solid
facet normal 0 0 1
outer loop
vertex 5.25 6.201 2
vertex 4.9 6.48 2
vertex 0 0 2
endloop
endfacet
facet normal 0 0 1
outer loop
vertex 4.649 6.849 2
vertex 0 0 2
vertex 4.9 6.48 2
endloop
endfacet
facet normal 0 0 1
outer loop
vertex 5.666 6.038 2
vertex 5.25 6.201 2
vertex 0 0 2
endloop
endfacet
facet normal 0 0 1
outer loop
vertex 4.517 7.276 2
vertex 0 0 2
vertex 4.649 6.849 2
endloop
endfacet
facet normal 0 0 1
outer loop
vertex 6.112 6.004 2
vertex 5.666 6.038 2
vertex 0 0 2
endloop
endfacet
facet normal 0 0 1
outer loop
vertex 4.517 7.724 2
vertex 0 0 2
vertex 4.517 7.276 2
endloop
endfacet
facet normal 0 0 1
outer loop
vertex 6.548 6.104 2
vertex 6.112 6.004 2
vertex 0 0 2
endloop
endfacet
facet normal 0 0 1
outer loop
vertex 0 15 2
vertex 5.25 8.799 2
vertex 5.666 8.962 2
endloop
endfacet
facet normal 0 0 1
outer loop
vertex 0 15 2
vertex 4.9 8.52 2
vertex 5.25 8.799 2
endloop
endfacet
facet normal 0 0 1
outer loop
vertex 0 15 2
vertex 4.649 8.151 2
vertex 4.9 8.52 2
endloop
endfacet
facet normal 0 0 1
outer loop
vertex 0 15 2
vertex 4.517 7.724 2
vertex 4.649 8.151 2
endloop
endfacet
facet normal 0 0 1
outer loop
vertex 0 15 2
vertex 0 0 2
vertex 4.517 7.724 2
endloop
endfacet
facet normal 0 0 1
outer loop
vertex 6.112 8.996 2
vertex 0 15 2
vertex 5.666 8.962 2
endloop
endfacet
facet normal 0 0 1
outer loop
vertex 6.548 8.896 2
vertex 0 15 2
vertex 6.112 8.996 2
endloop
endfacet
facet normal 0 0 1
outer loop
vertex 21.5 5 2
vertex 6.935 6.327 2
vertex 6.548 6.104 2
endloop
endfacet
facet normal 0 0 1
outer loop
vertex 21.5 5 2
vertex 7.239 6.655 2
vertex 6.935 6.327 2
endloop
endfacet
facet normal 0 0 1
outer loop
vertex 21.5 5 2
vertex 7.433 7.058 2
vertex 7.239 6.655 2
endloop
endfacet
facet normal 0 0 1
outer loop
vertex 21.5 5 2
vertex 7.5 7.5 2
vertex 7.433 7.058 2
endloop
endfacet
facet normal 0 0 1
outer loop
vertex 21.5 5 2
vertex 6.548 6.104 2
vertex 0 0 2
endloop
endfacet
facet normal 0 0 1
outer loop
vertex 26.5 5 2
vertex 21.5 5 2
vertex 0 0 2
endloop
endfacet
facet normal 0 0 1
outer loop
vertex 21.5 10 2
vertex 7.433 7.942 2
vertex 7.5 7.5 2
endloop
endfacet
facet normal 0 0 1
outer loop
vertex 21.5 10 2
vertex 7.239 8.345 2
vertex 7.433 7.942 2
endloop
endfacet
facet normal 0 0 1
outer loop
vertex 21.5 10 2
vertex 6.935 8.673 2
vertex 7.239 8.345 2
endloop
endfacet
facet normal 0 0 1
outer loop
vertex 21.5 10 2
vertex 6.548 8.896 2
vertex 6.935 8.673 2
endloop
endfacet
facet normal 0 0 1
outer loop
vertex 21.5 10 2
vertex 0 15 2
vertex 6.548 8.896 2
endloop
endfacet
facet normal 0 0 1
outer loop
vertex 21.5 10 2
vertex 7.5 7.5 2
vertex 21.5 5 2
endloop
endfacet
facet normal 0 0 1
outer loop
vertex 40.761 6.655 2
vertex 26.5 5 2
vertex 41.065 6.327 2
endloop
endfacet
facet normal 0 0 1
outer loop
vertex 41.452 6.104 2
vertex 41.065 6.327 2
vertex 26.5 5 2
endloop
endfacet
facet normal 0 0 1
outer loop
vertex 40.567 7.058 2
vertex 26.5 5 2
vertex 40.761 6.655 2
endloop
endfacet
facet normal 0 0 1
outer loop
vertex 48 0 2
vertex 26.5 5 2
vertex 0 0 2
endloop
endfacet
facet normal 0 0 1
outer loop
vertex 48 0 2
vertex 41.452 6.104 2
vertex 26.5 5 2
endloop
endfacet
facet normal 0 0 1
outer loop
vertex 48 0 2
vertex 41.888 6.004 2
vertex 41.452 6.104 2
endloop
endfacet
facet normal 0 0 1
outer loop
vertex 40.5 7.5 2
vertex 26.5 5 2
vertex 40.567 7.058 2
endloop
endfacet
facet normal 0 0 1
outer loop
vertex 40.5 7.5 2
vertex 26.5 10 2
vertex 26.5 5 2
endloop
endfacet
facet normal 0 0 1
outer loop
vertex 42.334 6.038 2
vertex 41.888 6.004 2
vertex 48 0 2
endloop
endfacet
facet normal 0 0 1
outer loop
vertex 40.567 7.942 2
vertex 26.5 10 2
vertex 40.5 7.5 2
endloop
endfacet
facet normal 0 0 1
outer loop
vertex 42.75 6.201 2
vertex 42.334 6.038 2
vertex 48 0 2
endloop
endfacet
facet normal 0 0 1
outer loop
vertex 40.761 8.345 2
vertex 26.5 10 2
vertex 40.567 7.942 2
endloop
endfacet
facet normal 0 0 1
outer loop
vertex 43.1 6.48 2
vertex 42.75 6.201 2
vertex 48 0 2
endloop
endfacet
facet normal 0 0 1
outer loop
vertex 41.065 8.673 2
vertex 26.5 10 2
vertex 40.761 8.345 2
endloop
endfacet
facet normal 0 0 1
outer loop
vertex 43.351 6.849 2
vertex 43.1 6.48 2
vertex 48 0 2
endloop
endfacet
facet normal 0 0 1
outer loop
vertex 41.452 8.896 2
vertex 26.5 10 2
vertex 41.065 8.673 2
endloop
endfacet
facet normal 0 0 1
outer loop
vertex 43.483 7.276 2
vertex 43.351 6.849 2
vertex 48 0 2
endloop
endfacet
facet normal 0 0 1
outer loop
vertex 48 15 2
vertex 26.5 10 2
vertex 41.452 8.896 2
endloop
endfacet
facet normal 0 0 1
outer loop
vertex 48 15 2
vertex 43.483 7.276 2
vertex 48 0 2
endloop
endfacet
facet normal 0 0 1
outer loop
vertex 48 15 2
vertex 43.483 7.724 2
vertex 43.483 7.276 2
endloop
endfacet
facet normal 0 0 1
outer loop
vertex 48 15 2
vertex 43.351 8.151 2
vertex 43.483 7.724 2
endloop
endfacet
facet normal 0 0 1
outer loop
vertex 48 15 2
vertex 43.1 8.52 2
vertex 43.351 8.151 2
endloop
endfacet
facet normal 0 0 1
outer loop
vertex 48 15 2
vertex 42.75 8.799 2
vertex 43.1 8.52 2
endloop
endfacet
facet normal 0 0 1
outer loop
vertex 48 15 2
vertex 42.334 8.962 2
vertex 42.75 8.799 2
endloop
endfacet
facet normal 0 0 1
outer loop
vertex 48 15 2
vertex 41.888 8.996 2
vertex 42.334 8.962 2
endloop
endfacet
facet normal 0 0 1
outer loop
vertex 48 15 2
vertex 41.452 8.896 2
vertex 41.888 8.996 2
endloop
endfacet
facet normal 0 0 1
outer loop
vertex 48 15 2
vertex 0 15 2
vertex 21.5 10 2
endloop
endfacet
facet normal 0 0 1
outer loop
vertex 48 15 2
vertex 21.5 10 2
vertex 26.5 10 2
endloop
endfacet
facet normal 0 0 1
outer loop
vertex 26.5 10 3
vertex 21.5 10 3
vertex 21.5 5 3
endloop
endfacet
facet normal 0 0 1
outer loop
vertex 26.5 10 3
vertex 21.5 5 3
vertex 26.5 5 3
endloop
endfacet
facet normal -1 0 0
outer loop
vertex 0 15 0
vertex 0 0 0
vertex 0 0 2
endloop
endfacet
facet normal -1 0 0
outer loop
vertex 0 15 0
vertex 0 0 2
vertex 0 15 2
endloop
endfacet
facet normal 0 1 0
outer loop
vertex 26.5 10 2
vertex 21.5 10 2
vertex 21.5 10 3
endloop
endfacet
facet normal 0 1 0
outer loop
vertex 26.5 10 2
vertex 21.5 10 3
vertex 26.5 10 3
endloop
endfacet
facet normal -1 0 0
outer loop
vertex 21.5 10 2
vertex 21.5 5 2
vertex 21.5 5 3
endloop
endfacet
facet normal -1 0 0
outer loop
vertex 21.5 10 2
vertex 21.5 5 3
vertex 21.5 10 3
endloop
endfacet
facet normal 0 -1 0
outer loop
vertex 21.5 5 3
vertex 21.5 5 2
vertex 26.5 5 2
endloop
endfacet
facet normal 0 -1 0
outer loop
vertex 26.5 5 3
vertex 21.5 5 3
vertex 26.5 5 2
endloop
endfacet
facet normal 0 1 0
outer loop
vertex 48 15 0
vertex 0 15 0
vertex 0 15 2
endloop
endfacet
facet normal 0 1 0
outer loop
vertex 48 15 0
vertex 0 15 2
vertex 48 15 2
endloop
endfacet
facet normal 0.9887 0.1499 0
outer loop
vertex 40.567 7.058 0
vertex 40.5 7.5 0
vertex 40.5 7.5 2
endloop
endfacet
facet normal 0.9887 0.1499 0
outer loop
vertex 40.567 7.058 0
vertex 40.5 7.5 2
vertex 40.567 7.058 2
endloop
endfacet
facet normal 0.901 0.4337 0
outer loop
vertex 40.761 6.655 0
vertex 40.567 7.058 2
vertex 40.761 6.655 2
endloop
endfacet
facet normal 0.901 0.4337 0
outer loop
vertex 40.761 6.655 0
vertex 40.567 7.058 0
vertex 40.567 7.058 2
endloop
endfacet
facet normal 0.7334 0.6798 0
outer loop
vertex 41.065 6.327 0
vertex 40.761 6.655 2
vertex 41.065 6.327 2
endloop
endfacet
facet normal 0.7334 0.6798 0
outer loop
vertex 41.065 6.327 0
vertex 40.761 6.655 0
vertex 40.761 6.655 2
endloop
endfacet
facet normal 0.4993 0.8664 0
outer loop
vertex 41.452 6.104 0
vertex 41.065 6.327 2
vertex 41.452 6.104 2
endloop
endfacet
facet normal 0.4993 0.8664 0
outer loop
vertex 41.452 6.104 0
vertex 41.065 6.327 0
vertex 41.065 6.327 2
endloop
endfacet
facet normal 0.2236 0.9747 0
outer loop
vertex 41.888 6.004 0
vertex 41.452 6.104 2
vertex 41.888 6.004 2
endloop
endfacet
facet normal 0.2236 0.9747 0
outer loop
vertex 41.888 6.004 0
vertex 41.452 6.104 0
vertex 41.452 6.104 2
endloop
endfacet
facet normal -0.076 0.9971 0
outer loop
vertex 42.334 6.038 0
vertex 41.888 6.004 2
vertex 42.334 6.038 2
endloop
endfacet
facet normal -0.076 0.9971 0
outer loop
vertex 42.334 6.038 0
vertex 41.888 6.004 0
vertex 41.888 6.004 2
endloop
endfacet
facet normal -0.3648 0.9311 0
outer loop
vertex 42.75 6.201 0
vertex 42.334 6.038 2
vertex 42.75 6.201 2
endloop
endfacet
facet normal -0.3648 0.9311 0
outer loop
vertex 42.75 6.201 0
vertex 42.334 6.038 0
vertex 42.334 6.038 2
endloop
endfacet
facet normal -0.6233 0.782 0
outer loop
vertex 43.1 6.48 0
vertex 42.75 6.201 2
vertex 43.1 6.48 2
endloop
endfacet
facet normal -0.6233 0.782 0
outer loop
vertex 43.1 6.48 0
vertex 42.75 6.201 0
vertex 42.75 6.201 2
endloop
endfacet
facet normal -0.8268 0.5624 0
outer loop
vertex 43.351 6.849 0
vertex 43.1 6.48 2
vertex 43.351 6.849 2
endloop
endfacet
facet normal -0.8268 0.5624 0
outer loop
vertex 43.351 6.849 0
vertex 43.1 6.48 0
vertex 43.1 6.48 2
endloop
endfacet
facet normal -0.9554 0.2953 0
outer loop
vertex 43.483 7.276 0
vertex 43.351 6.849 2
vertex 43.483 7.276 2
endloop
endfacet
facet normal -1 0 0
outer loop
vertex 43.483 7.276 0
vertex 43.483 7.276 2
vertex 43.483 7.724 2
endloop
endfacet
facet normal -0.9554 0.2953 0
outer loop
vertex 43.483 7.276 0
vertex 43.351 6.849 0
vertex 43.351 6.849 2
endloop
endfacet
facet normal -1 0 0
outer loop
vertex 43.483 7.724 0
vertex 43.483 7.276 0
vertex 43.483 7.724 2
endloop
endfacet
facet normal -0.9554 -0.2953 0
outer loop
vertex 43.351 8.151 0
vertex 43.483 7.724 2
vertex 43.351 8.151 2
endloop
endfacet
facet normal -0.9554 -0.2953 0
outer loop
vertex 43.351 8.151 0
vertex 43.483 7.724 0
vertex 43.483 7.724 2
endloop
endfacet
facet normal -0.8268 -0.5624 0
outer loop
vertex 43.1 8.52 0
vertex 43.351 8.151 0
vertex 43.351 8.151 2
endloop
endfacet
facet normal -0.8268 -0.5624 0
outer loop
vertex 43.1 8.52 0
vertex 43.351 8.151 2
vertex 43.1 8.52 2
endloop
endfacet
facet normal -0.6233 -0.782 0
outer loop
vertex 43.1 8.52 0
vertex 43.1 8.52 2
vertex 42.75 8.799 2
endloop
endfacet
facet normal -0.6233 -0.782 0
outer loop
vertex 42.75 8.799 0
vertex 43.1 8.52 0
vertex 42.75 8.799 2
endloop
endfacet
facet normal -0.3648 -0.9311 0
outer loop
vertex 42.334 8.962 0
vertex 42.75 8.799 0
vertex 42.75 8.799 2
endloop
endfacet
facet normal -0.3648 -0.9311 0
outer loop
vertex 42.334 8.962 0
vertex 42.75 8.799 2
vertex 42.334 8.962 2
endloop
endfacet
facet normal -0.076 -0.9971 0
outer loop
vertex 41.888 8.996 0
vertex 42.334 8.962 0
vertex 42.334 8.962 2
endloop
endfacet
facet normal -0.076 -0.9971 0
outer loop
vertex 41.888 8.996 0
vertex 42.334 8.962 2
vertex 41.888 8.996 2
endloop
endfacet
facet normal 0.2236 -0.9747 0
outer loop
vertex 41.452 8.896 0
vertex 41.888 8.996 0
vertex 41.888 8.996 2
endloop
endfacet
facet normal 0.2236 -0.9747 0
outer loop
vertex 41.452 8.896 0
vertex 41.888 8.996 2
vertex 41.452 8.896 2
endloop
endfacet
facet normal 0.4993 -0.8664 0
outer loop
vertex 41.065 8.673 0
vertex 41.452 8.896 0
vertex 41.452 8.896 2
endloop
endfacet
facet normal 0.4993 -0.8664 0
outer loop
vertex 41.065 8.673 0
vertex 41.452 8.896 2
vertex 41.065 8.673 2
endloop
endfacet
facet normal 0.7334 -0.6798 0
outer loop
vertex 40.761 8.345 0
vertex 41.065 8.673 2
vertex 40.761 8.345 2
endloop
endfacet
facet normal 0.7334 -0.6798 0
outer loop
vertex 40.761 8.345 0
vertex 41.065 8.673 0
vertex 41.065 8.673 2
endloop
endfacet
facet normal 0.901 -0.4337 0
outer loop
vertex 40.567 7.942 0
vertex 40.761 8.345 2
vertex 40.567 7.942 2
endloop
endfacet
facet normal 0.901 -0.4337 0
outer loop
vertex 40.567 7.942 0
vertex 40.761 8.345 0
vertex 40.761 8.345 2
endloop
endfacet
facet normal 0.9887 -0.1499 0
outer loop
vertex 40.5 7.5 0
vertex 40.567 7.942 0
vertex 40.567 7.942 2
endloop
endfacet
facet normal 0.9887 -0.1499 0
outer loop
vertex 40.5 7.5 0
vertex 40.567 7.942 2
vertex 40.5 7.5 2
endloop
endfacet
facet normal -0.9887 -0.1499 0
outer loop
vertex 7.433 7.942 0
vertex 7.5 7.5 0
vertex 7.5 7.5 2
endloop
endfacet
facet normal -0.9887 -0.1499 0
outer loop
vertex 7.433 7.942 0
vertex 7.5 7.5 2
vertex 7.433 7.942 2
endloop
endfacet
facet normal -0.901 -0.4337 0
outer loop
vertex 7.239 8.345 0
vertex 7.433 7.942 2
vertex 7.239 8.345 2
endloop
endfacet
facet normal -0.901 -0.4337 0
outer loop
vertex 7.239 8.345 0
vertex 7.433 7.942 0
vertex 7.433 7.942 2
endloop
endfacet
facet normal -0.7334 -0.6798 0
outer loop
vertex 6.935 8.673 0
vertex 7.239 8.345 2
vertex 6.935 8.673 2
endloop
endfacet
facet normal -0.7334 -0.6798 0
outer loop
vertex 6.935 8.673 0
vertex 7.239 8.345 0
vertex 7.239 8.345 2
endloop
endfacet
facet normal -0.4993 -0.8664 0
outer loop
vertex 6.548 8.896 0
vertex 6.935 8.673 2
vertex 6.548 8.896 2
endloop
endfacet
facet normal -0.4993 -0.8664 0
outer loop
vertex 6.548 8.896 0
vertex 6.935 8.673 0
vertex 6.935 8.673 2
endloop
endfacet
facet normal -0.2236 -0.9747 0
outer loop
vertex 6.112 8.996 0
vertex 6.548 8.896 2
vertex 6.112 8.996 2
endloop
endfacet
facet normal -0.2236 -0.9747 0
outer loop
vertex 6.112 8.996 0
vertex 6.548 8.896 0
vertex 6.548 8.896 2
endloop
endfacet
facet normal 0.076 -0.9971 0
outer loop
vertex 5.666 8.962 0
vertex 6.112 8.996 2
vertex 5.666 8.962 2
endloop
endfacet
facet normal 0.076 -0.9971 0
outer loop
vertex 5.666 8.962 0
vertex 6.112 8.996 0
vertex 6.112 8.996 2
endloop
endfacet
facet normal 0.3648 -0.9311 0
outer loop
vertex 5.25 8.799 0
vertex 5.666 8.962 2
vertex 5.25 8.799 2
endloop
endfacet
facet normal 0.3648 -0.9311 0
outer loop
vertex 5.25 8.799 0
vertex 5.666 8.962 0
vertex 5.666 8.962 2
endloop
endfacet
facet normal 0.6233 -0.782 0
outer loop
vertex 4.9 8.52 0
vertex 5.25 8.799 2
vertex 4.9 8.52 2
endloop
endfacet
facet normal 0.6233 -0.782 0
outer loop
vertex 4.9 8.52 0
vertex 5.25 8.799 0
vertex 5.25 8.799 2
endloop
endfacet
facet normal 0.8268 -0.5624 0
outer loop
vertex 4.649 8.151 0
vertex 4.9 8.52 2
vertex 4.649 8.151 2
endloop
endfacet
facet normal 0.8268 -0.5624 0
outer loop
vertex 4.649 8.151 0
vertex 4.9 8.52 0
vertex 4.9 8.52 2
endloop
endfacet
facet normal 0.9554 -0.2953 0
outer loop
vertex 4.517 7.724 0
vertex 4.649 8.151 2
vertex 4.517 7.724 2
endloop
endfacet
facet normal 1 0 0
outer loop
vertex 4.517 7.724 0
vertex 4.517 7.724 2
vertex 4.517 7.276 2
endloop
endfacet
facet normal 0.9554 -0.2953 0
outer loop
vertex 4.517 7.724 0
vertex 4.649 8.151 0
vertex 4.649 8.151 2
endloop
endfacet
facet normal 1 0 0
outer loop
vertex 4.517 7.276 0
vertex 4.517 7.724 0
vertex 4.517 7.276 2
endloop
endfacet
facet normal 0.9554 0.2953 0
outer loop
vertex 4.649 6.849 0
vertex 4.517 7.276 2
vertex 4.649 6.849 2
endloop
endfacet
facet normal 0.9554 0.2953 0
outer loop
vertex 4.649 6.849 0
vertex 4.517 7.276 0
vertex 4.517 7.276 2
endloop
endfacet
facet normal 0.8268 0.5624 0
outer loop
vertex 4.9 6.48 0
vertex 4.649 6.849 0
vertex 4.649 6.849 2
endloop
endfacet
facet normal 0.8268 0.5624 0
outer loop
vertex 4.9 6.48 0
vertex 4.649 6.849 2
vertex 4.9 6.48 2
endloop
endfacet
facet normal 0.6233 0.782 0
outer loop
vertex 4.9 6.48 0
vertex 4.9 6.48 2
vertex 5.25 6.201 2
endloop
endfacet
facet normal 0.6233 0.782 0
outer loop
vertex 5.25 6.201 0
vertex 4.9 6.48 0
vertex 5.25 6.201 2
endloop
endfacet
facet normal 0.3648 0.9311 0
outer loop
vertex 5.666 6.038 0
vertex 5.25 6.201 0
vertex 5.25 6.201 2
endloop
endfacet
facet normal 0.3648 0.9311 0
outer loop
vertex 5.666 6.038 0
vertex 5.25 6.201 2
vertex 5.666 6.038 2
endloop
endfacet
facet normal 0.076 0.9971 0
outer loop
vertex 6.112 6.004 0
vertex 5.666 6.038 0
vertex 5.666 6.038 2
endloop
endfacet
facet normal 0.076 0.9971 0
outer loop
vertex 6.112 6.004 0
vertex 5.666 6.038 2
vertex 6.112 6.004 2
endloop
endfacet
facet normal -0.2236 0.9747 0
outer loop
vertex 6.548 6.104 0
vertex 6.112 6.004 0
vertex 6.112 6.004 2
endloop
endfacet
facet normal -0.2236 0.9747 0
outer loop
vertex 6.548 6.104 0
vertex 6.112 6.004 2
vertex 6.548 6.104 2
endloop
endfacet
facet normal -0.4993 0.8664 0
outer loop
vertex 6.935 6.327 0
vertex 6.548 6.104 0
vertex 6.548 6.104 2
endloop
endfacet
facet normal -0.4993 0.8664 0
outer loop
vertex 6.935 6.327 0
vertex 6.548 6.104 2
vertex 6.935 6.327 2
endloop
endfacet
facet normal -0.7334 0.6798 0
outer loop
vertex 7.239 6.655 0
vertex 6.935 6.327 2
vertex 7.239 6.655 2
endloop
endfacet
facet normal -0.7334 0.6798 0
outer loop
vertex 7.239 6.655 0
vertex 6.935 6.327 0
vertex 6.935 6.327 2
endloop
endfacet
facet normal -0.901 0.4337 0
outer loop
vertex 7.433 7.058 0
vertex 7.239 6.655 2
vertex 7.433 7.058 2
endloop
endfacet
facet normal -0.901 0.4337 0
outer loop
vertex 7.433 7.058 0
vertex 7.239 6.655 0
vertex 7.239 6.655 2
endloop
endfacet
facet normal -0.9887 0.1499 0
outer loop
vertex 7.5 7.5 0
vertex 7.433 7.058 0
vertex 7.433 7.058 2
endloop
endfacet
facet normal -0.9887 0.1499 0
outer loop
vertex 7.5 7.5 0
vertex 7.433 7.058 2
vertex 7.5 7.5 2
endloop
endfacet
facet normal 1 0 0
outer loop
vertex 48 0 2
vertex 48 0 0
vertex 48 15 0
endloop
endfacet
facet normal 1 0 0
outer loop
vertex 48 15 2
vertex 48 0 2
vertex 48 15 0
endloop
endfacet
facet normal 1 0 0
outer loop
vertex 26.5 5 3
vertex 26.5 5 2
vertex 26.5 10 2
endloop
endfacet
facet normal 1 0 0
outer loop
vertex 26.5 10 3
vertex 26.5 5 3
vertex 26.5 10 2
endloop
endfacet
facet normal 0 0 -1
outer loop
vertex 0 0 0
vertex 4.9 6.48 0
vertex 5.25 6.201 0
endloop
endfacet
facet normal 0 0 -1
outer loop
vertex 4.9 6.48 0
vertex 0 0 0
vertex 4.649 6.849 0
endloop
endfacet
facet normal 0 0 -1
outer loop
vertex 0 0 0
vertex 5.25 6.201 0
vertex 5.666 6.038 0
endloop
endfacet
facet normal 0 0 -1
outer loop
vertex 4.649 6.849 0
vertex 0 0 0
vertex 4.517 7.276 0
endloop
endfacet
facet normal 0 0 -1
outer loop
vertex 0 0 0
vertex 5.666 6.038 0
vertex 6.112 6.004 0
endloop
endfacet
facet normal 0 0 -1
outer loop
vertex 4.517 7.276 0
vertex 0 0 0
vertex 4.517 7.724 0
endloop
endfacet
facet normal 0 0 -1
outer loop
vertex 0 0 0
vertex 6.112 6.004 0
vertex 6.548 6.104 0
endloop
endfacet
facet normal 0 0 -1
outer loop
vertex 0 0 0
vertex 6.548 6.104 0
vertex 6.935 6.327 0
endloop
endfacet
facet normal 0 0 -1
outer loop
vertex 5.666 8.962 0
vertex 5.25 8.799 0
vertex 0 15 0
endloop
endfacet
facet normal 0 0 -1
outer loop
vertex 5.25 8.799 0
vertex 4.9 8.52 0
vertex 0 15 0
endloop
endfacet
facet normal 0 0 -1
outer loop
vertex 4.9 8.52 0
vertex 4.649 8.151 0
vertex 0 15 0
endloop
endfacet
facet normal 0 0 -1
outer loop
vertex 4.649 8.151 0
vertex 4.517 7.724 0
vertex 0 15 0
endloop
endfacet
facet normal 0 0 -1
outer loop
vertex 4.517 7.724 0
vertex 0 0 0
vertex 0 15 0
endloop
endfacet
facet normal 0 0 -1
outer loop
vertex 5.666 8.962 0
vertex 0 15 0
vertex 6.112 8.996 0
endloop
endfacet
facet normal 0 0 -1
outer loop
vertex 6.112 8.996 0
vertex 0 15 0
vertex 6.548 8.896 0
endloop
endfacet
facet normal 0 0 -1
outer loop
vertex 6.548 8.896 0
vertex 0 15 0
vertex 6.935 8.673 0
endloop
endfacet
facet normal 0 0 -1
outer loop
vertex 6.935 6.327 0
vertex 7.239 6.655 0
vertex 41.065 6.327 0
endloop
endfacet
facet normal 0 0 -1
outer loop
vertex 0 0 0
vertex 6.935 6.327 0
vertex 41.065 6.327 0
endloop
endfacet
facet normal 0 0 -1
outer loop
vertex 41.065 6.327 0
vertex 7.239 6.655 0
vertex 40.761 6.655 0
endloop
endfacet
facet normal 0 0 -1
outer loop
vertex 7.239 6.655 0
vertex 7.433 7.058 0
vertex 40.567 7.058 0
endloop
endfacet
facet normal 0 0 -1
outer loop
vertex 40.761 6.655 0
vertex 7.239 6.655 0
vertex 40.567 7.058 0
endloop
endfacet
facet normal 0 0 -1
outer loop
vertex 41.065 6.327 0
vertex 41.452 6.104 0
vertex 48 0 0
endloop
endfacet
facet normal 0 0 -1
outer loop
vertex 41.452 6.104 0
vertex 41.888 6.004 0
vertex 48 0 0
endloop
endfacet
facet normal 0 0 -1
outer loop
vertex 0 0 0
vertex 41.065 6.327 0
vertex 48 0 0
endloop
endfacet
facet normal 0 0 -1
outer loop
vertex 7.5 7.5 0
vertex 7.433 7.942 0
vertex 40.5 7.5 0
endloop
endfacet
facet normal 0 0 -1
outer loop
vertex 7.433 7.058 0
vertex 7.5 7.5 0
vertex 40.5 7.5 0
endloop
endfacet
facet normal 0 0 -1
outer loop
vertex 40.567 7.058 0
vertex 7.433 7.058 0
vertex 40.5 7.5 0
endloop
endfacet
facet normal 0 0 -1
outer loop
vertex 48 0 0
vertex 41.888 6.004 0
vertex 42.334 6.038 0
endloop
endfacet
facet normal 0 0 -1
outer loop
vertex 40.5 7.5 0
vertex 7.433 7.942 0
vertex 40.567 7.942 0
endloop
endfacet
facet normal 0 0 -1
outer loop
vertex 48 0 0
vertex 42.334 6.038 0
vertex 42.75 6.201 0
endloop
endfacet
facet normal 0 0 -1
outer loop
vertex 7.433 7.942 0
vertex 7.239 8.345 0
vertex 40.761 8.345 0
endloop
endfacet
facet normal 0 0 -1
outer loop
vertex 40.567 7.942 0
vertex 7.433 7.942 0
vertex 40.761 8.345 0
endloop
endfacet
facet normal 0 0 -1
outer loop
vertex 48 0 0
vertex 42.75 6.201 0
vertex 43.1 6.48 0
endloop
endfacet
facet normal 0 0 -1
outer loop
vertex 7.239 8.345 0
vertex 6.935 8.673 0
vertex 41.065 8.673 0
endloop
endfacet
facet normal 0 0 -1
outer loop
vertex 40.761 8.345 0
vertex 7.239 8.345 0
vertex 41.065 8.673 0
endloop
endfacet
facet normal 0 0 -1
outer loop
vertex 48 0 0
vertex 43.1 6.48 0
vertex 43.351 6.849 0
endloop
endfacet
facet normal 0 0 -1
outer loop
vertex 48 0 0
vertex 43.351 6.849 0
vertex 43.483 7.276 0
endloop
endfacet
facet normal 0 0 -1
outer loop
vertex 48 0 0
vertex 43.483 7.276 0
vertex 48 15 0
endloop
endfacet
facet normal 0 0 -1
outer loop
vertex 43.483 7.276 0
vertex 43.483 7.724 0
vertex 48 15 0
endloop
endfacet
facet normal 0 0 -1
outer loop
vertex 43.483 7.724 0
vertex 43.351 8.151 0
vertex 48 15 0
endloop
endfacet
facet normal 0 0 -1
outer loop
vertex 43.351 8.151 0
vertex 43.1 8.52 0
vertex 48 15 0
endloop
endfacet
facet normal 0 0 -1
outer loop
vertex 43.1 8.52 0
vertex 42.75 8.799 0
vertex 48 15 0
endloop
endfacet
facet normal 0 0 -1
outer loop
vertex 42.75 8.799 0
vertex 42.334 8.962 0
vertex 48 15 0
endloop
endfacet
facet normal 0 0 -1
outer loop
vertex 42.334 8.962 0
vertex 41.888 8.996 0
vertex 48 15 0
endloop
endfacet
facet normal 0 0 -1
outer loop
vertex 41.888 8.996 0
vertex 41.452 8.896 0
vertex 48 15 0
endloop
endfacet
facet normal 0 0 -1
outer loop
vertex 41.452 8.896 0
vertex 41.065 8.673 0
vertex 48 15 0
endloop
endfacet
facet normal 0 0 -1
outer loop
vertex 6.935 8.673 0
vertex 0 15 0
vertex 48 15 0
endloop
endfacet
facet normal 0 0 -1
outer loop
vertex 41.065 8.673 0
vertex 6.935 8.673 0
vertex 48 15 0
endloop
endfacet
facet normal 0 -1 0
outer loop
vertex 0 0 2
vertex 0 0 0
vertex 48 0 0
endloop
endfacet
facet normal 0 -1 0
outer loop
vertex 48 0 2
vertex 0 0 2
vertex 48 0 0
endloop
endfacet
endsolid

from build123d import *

# Parameters (mm, degrees)
SKETCH1_W           = 48
SKETCH1_H           = 15
SKETCH1_R           = 1.5
BOSS_EXTRUDE1_DEPTH = 2
SKETCH2_W           = 5
SKETCH2_H           = 5
BOSS_EXTRUDE2_DEPTH = 1


with BuildPart() as part:
    # Sketch1 → Boss-Extrude1 (new body)
    with BuildSketch(Plane.XY):
        with Locations((24, 7.5)):
            Rectangle(SKETCH1_W, SKETCH1_H)
        with Locations((6, 7.5)):
            Circle(SKETCH1_R, mode=Mode.SUBTRACT)
        with Locations(Location((42, 7.5, 0), (0, 0, 180))):
            Circle(SKETCH1_R, mode=Mode.SUBTRACT)
    extrude(amount=BOSS_EXTRUDE1_DEPTH)

    # Sketch2 → Boss-Extrude2 (add)
    with BuildSketch(Plane.XY.offset(2)):
        with Locations((24, 7.5)):
            Rectangle(SKETCH2_W, SKETCH2_H)
    extrude(amount=BOSS_EXTRUDE2_DEPTH)


solid = part.part
